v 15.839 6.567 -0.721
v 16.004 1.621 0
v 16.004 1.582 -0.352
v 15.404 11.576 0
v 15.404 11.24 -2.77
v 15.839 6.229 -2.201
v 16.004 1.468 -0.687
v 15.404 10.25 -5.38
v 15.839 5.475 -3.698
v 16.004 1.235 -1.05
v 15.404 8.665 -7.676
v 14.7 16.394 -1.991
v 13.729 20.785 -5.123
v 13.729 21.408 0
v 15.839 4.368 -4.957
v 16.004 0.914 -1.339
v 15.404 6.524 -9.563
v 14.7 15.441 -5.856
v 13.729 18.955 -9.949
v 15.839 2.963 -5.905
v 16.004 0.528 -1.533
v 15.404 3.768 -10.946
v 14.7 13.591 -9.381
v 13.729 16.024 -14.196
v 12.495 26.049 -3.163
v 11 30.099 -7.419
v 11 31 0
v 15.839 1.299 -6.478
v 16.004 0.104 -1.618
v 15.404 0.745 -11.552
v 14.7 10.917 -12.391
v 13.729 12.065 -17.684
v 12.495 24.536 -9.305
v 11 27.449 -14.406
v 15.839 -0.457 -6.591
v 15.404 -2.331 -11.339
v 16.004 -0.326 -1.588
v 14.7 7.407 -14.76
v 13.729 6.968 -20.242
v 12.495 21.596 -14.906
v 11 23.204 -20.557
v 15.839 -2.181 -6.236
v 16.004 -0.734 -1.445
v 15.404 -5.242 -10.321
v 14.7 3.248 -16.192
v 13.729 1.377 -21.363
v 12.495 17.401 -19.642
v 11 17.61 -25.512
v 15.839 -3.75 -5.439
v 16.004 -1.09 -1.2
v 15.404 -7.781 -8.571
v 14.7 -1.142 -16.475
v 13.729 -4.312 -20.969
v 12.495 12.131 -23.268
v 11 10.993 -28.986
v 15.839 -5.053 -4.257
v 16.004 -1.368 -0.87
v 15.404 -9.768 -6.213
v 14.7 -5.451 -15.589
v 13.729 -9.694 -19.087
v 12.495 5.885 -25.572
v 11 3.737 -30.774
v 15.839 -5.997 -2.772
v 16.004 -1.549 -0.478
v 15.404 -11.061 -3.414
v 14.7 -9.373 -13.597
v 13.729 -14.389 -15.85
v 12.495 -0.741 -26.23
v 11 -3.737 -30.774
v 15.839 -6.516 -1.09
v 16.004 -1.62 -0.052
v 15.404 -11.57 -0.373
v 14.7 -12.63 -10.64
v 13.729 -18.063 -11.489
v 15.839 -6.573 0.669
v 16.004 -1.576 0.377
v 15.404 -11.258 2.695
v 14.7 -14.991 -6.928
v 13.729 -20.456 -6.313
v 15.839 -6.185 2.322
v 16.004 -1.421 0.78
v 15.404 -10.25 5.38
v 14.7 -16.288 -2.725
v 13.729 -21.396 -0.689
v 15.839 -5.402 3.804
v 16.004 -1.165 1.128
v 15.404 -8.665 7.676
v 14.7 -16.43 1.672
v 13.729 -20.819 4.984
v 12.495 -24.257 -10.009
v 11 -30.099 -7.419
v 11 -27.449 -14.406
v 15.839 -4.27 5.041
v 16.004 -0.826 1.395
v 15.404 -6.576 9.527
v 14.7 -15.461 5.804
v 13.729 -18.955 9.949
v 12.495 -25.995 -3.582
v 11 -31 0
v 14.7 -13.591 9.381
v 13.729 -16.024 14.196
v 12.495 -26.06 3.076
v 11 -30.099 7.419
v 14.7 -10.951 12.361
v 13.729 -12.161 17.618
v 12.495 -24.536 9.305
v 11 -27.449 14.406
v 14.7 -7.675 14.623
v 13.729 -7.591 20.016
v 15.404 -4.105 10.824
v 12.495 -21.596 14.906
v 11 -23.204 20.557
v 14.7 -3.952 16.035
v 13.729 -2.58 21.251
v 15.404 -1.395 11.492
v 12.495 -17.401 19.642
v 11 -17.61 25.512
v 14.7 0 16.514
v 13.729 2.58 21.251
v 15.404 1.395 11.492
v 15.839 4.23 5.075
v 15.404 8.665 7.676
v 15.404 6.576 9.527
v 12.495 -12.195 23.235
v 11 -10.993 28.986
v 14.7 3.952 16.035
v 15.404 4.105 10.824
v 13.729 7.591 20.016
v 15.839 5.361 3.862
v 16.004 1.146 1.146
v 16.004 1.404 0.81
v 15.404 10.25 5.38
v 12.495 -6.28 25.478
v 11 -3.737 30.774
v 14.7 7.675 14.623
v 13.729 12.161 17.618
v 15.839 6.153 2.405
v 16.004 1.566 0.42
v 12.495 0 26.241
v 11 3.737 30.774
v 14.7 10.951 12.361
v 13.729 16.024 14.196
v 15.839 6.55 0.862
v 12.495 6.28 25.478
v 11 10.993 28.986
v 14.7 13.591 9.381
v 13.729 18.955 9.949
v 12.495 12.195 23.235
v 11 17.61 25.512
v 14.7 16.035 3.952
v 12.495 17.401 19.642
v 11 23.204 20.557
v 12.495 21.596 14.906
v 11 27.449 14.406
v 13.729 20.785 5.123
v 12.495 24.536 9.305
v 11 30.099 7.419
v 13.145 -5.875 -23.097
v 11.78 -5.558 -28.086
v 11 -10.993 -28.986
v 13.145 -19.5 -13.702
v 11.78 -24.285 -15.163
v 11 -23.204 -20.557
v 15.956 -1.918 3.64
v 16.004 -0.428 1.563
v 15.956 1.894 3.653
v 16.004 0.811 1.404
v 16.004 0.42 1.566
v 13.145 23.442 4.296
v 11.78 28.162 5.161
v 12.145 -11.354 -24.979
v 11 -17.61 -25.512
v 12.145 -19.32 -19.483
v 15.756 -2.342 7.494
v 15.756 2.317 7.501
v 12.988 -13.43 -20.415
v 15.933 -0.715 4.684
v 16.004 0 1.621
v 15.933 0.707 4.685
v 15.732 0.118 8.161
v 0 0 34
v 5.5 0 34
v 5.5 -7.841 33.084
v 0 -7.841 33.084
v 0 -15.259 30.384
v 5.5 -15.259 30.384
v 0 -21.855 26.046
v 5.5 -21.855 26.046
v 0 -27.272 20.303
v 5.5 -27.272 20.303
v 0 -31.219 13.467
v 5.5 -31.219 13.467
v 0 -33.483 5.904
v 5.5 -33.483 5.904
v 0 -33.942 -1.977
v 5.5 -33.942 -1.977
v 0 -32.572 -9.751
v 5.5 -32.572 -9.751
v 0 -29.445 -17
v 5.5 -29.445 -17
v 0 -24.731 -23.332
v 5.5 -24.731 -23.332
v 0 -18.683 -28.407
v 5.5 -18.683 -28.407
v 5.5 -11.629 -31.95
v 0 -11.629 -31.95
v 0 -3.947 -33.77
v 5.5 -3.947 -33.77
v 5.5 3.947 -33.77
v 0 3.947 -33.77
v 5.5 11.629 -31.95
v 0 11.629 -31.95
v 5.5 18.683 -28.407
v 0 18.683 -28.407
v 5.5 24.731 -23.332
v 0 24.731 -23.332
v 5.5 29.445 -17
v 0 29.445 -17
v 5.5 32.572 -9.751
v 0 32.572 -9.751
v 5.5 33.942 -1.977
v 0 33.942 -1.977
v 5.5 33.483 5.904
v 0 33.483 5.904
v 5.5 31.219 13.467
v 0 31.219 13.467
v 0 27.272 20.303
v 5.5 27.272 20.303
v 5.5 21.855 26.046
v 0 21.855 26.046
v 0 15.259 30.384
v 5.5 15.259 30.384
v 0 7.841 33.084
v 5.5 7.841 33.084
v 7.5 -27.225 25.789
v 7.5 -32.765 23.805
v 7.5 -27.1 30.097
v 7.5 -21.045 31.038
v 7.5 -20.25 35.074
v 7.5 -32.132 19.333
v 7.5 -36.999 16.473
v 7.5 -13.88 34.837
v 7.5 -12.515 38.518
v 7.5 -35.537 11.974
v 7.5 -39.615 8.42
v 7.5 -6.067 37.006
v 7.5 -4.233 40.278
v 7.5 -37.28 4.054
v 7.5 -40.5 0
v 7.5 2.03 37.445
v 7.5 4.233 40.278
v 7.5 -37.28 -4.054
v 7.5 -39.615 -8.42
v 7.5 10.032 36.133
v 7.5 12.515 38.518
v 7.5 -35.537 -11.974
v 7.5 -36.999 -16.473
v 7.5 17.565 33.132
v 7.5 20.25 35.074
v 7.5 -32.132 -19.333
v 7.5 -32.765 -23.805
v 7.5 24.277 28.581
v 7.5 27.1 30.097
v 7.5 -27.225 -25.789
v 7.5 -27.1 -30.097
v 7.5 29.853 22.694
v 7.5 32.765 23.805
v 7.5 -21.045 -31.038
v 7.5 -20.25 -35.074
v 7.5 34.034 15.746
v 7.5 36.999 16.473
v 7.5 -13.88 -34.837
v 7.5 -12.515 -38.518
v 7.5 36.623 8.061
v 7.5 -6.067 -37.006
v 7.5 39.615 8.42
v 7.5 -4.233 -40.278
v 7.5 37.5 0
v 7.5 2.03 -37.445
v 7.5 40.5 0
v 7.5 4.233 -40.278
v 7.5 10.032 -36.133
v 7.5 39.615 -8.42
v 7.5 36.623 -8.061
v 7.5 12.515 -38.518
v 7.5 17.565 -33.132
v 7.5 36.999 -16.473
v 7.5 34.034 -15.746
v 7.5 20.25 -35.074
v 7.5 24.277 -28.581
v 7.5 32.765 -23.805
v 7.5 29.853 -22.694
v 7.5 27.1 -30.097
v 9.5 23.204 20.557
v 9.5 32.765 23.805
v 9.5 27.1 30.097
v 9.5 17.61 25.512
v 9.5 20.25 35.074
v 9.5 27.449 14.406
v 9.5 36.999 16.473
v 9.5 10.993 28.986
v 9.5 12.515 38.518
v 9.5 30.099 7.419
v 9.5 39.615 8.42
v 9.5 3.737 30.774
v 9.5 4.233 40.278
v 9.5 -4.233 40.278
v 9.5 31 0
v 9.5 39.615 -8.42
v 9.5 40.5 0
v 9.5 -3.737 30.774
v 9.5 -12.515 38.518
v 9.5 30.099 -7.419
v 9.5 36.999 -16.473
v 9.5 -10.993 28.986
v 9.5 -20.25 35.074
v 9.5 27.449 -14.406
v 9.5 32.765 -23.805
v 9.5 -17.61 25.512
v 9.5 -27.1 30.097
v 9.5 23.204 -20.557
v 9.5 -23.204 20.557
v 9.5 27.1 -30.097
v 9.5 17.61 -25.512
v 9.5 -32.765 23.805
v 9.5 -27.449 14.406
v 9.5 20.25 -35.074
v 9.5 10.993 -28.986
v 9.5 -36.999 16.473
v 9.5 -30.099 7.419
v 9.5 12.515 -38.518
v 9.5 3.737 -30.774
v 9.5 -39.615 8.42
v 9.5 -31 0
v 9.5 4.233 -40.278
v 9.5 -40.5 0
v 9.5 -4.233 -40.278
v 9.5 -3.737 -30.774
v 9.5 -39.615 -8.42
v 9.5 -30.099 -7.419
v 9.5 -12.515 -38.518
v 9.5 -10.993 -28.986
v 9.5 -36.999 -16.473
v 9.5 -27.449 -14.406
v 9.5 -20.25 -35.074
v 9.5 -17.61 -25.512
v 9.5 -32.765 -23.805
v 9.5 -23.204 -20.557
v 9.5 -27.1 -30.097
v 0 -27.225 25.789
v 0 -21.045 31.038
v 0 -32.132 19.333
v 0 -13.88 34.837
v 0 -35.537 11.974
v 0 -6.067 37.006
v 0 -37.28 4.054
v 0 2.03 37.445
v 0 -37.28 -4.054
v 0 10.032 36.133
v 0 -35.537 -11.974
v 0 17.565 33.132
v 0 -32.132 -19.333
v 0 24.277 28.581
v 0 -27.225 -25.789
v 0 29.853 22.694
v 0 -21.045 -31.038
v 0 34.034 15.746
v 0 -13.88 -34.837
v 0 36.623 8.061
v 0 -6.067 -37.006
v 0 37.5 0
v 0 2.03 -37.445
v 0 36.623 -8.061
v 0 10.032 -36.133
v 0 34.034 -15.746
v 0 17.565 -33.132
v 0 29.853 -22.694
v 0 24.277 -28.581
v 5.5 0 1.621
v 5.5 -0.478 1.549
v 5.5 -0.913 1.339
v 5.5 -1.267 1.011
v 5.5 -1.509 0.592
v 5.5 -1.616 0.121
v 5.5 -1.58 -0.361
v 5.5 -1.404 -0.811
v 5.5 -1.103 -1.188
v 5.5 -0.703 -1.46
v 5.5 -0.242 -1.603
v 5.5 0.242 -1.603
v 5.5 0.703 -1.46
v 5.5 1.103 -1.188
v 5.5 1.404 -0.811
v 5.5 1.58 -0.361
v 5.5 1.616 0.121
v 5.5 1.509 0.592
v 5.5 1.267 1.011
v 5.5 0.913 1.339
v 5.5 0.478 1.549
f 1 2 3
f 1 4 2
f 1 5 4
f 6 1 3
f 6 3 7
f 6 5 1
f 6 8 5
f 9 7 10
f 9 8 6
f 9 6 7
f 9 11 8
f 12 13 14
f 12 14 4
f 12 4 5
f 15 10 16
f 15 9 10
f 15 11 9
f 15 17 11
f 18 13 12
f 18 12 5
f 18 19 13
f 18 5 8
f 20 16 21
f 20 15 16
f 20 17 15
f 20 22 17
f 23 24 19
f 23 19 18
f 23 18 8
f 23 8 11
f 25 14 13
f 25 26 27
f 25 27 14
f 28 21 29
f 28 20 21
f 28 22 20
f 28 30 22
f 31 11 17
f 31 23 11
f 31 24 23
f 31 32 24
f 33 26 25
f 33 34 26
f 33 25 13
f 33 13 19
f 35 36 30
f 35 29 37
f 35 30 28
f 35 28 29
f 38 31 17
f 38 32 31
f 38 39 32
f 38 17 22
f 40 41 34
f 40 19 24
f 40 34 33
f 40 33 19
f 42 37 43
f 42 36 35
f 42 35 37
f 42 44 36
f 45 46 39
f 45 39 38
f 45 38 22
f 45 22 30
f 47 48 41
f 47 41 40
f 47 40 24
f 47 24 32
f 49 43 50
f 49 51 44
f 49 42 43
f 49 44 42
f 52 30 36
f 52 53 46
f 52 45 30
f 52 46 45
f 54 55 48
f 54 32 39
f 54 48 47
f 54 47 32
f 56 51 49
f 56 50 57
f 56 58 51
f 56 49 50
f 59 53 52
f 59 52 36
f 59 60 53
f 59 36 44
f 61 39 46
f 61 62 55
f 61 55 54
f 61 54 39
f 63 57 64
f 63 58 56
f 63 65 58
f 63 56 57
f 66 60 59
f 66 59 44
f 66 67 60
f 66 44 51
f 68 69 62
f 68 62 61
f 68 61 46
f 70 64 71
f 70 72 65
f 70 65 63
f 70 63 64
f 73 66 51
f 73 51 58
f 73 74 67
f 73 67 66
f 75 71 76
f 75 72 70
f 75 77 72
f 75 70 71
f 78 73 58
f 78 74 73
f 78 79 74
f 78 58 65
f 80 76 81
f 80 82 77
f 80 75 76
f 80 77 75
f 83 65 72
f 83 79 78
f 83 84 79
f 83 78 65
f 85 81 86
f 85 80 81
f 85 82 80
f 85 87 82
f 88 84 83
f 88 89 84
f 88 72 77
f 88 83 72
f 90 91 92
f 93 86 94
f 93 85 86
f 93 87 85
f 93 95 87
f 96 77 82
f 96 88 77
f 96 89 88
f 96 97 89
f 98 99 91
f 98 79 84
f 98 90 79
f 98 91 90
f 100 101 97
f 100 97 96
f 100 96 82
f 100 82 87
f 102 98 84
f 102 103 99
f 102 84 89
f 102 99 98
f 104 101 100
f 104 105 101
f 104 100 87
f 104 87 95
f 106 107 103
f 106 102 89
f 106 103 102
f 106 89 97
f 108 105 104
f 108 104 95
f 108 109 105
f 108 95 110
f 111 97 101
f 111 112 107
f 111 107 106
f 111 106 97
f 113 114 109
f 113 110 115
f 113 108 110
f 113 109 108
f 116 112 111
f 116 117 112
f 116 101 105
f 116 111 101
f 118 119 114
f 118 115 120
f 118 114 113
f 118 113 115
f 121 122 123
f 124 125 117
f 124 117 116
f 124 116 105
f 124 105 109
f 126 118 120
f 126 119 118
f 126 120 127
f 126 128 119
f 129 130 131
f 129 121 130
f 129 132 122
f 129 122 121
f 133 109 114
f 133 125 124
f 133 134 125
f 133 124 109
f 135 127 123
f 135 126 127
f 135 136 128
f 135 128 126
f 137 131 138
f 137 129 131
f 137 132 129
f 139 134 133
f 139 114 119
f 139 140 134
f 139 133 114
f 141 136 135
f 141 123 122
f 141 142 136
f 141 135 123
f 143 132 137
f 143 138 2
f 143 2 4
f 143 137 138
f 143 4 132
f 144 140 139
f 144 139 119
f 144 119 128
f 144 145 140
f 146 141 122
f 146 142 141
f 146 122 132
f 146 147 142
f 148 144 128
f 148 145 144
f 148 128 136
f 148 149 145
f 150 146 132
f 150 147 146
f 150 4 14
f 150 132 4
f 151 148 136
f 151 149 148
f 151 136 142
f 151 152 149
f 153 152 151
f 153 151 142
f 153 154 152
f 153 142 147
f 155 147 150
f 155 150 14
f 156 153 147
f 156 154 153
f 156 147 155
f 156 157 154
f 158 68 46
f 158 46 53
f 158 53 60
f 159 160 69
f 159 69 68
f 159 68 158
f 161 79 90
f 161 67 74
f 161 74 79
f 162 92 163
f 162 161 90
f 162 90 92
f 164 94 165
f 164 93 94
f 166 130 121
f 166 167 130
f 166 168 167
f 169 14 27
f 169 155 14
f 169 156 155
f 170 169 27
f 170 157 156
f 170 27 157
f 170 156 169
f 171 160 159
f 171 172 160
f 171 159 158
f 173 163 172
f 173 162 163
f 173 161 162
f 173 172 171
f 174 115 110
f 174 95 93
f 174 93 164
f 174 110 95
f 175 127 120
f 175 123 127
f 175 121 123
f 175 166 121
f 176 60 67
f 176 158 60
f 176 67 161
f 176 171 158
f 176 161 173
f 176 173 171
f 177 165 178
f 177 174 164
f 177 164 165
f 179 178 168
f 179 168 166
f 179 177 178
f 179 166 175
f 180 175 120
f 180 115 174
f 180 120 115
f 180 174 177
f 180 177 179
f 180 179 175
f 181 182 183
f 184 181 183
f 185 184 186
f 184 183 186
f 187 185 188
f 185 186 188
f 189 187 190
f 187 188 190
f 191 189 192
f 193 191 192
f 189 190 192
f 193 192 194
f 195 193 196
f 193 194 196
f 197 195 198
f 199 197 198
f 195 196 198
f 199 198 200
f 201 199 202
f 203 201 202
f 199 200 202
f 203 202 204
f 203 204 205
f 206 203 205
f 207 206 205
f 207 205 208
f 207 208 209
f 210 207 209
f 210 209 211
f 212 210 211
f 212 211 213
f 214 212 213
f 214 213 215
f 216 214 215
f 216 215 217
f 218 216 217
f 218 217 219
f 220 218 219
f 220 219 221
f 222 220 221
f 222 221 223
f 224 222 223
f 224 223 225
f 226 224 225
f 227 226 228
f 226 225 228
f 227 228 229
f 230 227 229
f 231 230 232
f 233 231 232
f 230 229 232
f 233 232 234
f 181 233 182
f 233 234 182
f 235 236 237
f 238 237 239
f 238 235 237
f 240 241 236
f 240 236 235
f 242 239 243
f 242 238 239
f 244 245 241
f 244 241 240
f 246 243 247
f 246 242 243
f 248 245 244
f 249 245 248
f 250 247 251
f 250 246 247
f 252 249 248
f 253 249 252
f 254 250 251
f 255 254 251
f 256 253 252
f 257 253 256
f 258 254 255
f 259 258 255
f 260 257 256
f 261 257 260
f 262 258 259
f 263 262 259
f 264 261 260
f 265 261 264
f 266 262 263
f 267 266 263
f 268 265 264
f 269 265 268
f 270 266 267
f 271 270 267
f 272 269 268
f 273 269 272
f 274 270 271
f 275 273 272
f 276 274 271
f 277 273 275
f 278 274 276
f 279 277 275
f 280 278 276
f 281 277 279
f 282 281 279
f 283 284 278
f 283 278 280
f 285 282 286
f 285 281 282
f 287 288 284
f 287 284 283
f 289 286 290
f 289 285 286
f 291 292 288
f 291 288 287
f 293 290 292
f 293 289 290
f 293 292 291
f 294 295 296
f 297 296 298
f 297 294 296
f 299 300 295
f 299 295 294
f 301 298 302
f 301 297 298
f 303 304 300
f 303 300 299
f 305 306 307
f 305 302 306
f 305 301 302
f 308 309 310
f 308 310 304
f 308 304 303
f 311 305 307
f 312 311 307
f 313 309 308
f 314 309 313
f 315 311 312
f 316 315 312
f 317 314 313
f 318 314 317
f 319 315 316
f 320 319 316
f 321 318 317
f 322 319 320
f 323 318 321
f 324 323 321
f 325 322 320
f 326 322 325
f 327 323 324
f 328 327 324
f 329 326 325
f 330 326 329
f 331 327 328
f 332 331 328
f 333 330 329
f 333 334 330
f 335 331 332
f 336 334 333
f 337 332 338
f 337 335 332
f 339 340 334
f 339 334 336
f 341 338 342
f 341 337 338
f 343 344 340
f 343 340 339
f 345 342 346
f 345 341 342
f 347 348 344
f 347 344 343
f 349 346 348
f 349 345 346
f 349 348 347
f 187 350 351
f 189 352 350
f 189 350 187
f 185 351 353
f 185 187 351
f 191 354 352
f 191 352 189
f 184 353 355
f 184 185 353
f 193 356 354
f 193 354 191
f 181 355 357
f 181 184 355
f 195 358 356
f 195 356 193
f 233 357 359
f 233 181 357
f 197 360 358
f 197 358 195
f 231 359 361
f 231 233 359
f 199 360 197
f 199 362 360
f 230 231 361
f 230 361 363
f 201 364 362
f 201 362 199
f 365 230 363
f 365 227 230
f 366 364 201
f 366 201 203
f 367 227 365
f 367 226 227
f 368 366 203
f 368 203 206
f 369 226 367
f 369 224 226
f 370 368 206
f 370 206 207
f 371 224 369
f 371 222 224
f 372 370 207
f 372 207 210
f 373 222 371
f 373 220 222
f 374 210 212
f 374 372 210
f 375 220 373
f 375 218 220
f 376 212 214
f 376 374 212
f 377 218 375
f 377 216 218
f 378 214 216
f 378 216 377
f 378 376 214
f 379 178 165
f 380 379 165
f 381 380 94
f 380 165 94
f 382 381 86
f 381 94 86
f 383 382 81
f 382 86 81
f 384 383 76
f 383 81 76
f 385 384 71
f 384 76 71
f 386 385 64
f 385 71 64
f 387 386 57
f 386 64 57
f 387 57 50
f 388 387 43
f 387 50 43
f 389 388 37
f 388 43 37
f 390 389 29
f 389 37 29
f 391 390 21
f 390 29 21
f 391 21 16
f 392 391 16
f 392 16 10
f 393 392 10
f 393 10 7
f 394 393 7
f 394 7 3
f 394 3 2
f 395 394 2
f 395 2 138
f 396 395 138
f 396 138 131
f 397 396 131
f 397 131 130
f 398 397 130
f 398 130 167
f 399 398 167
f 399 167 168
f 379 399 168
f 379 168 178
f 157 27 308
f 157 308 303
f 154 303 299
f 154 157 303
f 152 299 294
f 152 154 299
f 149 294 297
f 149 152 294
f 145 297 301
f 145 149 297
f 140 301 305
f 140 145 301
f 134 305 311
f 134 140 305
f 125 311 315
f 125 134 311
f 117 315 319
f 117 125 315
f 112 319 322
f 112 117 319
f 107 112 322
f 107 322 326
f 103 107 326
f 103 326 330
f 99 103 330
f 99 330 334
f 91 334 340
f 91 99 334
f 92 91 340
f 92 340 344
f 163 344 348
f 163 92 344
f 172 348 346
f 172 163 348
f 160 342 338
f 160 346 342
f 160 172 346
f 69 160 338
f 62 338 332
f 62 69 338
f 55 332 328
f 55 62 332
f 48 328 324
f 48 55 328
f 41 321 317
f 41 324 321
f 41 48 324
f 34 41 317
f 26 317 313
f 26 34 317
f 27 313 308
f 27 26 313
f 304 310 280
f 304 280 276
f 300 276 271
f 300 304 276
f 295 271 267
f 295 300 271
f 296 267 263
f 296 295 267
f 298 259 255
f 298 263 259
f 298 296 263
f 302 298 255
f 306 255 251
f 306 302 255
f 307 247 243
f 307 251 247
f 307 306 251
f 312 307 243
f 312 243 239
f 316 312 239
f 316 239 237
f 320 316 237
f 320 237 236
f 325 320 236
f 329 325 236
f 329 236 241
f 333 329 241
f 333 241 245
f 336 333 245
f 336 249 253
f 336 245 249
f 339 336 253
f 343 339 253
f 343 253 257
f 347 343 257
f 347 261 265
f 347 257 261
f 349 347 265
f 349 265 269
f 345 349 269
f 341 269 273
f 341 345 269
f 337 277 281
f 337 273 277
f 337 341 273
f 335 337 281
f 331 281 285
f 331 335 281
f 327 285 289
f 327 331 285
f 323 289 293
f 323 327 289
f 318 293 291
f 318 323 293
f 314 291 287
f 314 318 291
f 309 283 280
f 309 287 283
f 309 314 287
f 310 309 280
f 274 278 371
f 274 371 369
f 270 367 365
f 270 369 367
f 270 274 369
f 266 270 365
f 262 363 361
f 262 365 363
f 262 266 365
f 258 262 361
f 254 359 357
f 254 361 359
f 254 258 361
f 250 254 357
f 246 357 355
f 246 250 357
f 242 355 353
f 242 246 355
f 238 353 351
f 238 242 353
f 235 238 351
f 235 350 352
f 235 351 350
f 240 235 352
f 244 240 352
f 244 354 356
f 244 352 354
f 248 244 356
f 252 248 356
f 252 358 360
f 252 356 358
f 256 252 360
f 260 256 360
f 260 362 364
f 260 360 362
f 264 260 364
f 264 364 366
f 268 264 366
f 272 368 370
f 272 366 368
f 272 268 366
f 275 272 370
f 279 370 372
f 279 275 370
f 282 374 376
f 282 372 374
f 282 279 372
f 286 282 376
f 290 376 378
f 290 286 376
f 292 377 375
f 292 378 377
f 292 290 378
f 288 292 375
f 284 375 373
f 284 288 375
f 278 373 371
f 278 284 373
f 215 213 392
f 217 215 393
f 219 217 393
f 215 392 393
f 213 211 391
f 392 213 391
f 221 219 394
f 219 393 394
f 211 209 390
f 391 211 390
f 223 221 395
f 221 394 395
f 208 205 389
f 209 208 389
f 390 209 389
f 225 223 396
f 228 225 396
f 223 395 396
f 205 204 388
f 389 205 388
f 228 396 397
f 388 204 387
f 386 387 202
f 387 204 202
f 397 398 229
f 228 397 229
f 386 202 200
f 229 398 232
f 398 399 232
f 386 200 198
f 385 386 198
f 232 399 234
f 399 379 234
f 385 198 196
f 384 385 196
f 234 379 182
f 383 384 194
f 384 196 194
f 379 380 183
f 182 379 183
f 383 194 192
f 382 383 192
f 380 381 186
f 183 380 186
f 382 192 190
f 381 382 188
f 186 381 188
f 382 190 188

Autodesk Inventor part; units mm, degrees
ref_plane "YZ Plane" through (0, 0, 0) normal (1, 0, 0) x (0, 1, 0)
ref_plane "XZ Plane" through (0, 0, 0) normal (0, 1, 0) x (-1, 0, 0)
ref_plane "XY Plane" through (0, 0, 0) normal (0, 0, 1) x (1, 0, 0)
sketch "Sketch1" plane through (0, 0, 0) normal (0, 0, 1) x (1, 0, 0)
  line L0 (0, 0) -> (0, 37.5)
  line L1 (0, 37.5) -> (7.5, 37.5)
  line L2 (7.5, 37.5) -> (7.5, 40.5)
  line L3 (7.5, 40.5) -> (9.5, 40.5)
  line L4 (9.5, 40.5) -> (9.5, 31)
  line L5 (151.3726, 0) -> (0, 0)
  line L6 (9.5, 31) -> (11, 31)
  arc A0 (16, 0) -> (11, 31) centre (-75.9938, 1.0655) ccw
  line L7 (0, 34) -> (9.5, 34) construction
  dimension "d1" = 2
  dimension "d2" = 7.5
  dimension "d4" = 75
  dimension "d5" = 81
  dimension "d6" = 1.5
  dimension "d7" = 92
  dimension "d8" = 68
  dimension "d9" = 16
  dimension "d10" = 62
revolve "Revolution1" add sketch "Sketch1" angle 360 about axis through (151.3726, 0, 0) along (-1, 0, 0)
sketch "Sketch2" plane through (0, 0, 0) normal (-1, 0, 0) x (0, 0, 1)
  circle A0 centre (0, 0) radius 37.5 projected
hole "Hole1" at (0, 0, 0) direction (1, 0, 0) diameter 68 depth 5.5
sketch "Sketch3" plane through (5.5, 0, 0) normal (-1, 0, 0) x (0, 0, 1)
  circle A0 centre (0, 0) radius 31 projected
hole "Hole2" at (5.5, 0, 0) direction (1, 0, 0) diameter 3.242 end through all thread size "M4x0.7" class "6H" standard "ISO Metric profile"
properties part number "130 part 2" material "Aluminum 6061-AHC"
